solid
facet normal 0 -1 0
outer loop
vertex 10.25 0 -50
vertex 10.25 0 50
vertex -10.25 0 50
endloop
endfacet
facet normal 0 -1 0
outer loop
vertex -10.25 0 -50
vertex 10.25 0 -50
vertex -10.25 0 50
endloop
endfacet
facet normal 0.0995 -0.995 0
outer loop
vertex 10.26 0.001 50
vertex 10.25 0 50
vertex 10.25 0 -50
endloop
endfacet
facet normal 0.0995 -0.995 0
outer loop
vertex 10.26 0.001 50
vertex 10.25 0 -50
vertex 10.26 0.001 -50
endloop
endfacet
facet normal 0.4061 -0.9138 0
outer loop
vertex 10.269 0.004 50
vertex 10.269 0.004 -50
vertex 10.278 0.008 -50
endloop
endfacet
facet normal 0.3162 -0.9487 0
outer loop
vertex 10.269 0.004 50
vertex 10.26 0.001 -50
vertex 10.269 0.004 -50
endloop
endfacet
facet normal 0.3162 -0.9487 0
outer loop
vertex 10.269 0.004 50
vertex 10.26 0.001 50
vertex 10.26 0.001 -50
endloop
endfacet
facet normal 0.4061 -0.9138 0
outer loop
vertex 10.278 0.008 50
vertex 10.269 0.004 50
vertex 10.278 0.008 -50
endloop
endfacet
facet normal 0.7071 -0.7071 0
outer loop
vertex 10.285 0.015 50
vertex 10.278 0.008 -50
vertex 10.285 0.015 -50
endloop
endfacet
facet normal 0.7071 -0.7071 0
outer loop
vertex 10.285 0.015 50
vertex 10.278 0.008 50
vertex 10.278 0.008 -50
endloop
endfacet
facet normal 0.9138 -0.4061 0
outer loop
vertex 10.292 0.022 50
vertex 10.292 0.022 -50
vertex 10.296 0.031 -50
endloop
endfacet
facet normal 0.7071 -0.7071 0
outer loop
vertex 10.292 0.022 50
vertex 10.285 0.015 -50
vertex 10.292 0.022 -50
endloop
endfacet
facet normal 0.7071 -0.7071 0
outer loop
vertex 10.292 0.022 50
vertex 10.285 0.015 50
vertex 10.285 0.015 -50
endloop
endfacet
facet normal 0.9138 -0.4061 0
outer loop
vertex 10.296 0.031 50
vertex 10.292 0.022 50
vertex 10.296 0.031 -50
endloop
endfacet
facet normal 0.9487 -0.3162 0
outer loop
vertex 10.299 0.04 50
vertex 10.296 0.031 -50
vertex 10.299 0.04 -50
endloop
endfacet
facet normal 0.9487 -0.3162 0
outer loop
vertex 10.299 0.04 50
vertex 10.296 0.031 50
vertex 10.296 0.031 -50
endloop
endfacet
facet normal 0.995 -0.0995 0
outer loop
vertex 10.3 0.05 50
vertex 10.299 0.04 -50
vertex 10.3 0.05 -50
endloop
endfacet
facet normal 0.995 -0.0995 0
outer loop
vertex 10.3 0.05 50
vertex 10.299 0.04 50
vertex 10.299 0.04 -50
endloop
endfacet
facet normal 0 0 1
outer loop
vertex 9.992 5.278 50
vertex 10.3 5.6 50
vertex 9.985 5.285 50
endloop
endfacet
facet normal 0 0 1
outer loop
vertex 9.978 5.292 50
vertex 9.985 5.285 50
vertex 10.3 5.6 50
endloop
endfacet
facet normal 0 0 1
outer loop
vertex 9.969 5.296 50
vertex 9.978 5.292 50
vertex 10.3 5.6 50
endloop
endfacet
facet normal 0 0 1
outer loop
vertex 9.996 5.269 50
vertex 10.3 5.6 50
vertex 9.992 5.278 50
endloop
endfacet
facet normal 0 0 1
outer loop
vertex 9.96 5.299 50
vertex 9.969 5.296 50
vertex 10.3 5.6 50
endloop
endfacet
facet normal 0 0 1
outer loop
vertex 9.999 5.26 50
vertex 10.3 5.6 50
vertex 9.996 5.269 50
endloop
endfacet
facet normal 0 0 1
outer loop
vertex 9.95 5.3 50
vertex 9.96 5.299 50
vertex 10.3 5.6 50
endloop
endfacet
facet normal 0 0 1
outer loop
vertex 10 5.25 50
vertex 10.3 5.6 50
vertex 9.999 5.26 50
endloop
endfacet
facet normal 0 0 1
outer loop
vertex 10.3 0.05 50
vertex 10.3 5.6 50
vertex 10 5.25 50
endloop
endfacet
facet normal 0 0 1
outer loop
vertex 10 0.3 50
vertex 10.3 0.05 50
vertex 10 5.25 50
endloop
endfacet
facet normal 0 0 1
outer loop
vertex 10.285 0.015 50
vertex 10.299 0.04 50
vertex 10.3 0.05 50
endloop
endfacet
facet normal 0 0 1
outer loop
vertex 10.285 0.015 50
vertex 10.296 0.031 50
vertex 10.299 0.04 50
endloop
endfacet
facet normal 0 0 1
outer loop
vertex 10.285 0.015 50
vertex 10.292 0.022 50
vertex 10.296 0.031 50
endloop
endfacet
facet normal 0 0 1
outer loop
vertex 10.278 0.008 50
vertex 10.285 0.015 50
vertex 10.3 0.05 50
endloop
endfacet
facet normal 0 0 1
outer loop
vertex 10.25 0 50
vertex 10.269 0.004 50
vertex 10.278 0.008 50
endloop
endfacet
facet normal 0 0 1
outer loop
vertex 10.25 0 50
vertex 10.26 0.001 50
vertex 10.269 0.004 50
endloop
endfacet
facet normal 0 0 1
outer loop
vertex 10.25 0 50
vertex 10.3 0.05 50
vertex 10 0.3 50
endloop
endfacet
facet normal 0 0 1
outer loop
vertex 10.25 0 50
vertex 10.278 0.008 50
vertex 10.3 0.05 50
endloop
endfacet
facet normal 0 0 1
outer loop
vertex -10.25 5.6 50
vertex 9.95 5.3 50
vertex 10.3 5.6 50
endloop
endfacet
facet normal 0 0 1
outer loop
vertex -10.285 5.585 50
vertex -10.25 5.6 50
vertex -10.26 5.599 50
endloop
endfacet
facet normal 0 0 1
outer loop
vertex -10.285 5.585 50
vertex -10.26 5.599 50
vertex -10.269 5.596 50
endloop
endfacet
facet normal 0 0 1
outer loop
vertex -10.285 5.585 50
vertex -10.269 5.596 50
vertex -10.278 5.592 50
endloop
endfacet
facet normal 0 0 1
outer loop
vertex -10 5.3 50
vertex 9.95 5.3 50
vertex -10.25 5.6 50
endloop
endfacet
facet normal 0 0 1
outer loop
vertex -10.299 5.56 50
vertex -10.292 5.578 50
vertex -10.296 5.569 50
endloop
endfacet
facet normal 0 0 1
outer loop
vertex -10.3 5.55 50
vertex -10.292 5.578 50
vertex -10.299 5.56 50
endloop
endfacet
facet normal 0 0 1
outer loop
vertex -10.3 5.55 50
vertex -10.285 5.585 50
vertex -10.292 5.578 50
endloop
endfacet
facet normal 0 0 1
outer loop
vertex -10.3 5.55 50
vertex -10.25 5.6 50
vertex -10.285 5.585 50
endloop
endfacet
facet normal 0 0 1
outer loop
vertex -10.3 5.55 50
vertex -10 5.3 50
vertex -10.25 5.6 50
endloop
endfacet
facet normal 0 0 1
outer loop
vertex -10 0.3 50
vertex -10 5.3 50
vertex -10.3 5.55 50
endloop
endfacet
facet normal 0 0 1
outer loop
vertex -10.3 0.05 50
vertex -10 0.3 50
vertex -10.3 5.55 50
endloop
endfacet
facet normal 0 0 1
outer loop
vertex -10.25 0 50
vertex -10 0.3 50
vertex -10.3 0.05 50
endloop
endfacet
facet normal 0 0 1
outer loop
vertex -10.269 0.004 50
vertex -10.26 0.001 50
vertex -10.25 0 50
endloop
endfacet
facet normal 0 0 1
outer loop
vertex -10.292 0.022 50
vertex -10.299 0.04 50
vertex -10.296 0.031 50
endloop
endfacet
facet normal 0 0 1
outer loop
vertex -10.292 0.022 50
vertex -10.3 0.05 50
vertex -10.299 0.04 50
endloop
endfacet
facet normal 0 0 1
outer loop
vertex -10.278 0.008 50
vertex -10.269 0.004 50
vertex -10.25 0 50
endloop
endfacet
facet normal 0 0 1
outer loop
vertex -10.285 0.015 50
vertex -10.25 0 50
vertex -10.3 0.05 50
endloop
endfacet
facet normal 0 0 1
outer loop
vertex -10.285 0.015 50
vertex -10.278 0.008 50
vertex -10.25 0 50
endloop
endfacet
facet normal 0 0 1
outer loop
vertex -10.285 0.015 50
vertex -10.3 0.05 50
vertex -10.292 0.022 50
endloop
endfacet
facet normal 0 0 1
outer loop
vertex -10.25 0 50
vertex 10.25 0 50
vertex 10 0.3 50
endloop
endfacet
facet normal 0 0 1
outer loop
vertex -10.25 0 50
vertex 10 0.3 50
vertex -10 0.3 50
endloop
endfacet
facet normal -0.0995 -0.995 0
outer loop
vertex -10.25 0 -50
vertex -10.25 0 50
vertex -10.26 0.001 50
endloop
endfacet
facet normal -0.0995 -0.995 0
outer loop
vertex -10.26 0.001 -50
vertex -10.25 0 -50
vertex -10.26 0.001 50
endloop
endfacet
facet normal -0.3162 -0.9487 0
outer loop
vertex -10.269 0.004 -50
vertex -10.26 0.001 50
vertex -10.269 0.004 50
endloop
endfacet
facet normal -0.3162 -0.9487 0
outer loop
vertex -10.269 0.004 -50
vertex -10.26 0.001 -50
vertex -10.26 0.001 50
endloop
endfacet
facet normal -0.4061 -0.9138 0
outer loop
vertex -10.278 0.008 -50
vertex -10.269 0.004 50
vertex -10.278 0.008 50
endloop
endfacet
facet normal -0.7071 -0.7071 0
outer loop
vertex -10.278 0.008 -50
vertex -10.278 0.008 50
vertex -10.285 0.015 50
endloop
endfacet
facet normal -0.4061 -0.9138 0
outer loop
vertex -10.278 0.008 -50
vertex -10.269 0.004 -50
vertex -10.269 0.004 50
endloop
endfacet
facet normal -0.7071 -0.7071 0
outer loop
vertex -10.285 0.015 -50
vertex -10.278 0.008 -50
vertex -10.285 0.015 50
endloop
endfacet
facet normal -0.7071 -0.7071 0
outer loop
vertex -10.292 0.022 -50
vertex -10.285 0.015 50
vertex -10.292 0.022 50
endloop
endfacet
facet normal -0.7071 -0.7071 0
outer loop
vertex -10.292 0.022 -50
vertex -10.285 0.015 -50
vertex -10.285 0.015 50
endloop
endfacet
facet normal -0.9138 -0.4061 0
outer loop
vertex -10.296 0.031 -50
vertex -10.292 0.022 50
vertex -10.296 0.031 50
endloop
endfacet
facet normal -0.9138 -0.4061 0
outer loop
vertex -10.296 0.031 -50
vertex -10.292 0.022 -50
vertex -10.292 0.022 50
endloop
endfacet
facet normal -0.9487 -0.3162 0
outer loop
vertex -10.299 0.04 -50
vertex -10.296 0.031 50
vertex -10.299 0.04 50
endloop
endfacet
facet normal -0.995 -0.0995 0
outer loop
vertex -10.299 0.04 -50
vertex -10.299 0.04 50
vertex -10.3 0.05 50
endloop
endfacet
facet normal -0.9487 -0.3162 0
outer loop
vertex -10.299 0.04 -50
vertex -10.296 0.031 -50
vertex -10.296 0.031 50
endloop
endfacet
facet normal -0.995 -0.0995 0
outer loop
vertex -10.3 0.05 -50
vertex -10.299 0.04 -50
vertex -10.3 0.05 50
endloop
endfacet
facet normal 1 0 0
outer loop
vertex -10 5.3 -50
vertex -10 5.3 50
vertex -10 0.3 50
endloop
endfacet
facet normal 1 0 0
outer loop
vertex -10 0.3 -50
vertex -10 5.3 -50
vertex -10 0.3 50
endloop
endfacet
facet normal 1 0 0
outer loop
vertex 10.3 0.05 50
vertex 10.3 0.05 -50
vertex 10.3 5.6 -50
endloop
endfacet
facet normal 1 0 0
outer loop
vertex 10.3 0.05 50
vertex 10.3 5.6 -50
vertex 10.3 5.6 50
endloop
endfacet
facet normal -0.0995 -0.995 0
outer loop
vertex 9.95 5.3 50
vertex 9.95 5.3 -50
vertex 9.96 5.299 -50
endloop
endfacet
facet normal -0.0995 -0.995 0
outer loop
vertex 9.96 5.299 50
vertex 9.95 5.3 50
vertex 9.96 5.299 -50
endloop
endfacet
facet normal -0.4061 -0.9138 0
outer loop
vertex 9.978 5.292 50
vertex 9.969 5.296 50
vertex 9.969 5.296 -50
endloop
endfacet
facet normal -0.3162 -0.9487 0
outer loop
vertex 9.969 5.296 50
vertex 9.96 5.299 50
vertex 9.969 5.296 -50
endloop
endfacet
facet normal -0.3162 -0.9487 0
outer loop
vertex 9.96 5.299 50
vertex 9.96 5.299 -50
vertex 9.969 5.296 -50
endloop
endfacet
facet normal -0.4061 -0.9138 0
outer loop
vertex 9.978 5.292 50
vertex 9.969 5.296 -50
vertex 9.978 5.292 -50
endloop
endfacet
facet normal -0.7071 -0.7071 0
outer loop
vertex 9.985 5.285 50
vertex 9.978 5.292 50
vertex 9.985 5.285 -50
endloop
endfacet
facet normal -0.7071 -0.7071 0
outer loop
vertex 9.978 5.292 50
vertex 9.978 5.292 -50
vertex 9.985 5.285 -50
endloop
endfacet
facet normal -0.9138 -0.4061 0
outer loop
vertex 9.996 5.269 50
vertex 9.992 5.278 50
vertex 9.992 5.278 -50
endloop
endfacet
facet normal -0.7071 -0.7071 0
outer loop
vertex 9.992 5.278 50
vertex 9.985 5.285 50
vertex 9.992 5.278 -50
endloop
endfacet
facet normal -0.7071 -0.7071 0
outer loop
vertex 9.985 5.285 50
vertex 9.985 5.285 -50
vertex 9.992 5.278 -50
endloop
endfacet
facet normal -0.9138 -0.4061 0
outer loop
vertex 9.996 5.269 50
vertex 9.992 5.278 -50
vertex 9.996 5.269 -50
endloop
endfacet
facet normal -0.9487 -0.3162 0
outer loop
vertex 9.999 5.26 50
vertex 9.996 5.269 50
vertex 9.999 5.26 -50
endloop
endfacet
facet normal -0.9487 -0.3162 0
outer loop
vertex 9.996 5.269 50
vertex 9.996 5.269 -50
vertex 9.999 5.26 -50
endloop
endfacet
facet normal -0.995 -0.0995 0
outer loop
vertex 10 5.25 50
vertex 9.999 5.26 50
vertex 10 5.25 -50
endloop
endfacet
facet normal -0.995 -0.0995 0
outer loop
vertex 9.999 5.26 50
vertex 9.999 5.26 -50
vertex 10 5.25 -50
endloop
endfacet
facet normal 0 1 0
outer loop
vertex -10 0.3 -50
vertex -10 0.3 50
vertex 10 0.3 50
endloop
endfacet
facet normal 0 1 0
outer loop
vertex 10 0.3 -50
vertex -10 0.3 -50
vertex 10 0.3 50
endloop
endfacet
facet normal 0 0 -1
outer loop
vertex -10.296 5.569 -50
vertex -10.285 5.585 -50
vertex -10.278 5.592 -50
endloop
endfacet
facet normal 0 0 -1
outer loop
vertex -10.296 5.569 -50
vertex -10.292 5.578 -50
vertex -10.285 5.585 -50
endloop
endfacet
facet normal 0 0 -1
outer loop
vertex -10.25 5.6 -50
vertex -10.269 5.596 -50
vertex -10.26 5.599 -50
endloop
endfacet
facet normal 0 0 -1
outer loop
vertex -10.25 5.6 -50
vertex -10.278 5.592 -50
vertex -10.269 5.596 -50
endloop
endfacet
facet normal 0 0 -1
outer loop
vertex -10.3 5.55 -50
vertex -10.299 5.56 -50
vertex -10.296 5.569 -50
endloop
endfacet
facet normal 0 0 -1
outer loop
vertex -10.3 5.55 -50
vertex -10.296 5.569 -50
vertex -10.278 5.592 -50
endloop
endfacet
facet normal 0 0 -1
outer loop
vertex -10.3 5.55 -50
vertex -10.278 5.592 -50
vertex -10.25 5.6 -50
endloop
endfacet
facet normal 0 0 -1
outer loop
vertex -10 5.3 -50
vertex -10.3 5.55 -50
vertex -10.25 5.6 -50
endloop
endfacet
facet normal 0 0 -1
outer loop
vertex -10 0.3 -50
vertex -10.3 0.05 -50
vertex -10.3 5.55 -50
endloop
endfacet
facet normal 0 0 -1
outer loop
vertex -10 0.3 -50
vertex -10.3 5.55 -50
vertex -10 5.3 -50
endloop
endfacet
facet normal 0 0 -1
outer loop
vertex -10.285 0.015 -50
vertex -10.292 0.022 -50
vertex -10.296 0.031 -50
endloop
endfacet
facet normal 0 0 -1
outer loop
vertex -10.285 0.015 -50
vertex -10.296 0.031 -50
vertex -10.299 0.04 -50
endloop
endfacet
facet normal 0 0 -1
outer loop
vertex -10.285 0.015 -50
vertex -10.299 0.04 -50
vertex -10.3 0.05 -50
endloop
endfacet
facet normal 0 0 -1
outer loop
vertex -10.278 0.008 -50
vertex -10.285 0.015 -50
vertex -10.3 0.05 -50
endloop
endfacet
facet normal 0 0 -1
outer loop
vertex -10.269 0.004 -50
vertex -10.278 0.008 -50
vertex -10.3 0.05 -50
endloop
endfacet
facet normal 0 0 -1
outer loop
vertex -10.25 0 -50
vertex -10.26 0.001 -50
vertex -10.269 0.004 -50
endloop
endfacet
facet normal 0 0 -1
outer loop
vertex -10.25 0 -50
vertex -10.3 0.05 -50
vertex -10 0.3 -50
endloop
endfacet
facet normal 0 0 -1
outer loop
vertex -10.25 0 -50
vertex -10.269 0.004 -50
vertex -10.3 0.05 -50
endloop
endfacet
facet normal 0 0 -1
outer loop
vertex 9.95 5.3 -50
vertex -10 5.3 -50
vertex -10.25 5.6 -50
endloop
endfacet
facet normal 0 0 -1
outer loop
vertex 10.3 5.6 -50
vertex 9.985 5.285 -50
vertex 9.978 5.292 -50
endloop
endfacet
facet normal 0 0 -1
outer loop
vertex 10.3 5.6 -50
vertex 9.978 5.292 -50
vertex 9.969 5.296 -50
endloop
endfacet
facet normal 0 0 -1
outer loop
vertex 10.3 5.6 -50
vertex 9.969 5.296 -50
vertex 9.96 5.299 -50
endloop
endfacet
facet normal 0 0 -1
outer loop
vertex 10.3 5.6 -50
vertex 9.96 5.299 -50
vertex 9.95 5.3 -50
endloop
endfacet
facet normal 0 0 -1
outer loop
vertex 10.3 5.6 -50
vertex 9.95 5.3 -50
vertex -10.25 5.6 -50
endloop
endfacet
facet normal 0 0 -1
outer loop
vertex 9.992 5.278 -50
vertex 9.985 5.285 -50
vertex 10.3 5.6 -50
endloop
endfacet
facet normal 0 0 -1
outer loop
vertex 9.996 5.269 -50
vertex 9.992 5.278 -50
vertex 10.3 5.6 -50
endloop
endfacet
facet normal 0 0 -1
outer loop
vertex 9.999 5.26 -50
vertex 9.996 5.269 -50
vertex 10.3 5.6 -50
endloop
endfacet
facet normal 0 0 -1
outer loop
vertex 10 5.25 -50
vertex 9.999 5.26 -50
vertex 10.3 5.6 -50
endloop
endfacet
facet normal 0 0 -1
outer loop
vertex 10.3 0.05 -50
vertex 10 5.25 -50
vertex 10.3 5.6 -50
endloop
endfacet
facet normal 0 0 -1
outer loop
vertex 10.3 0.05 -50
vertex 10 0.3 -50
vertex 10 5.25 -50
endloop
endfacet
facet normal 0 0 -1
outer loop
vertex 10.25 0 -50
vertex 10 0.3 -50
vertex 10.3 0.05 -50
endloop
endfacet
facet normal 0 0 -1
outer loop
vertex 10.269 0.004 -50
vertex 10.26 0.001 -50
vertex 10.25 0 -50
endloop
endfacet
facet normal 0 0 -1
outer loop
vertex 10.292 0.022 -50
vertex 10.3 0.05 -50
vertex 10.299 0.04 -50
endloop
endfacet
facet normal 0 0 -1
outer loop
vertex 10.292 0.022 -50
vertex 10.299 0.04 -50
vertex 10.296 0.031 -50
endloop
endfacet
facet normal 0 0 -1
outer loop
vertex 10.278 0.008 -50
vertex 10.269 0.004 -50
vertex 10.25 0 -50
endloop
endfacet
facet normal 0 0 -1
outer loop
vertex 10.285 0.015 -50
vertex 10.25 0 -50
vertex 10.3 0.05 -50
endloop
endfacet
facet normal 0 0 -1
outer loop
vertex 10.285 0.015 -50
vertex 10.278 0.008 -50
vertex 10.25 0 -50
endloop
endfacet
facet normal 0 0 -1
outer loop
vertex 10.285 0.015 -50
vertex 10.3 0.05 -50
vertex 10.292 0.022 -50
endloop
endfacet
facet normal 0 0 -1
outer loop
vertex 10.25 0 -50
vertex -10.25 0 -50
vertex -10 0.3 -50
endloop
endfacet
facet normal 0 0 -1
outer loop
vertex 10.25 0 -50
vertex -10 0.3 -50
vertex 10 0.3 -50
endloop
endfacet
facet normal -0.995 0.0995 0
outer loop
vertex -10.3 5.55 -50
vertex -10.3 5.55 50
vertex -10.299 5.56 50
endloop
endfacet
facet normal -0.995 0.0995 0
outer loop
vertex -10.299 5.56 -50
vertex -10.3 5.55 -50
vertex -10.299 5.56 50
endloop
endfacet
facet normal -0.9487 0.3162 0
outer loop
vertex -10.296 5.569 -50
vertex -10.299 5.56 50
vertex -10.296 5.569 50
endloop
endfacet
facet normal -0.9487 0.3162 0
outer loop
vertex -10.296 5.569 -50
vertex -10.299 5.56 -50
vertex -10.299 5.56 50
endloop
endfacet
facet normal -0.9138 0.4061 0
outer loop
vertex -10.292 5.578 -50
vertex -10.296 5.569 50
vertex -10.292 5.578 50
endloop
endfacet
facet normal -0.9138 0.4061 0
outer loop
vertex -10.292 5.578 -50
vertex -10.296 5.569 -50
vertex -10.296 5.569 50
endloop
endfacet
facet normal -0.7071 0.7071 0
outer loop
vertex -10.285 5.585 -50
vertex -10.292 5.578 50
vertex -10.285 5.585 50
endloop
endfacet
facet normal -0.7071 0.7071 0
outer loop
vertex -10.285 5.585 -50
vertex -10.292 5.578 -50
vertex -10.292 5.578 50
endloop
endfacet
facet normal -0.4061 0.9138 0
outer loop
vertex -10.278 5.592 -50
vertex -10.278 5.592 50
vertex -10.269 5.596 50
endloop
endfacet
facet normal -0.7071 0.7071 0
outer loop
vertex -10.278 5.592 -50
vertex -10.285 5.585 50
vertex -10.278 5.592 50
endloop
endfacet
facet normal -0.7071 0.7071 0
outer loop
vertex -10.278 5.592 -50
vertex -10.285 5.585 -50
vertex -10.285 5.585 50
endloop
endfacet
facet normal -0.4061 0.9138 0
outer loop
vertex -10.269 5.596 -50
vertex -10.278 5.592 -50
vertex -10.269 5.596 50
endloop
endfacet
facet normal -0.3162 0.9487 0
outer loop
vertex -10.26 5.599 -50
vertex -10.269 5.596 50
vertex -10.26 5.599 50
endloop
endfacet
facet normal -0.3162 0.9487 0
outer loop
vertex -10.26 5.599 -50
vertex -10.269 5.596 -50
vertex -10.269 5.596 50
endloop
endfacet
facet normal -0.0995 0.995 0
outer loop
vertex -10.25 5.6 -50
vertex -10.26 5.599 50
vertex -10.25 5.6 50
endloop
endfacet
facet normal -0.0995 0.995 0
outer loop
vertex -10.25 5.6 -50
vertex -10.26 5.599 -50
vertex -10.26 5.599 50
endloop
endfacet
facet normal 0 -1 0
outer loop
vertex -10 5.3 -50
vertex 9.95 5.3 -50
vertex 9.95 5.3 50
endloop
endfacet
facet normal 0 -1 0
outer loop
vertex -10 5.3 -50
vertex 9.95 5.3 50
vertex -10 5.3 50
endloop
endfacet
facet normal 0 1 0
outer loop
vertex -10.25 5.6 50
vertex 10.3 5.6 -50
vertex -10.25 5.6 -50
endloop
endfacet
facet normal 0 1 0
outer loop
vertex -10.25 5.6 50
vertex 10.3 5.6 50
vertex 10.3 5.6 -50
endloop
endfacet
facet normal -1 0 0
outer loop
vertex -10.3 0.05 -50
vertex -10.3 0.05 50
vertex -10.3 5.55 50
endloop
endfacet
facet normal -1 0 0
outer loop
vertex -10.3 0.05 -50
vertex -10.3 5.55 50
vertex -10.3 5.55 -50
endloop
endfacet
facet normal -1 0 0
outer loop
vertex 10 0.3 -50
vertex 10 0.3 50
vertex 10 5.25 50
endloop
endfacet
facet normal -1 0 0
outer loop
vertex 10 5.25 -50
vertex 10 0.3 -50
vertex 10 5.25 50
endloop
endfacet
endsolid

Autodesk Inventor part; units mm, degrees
ref_plane "YZ Plane" through (0, 0, 0) normal (1, 0, 0) x (0, 1, 0)
ref_plane "XZ Plane" through (0, 0, 0) normal (0, 1, 0) x (-1, 0, 0)
ref_plane "XY Plane" through (0, 0, 0) normal (0, 0, 1) x (1, 0, 0)
sketch "Sketch1" plane through (0, 0, 0) normal (0, 1, 0) x (-1, 0, 0)
  line L0 (-10.3, 50) -> (10.3, 50)
  line L1 (10.3, 50) -> (10.3, -50)
  line L2 (10.3, -50) -> (-10.3, -50)
  line L3 (-10.3, -50) -> (-10.3, 50)
  line L4 (-10.3, 50) -> (10.3, -50) construction
  line L5 (10.3, 50) -> (-10.3, -50) construction
  point P0 (0, 0)
  dimension "d0" = 100
  dimension "d1" = 20.6
extrude "Extrusion1" add sketch "Sketch1" along normal blind 5.6
sketch "Sketch2" plane through (-10.3, 0, 50) normal (0, 0, 1) x (1, 0, 0)
  line L0 (0.3, 0.3) -> (20.3, 0.3)
  line L1 (20.3, 0.3) -> (20.3, 5.3)
  line L2 (20.3, 5.3) -> (0.3, 5.3)
  line L3 (0.3, 5.3) -> (0.3, 0.3)
  line L4 (0, 0) -> (20.6, 0) projected
  line L5 (0, 5.6) -> (20.6, 5.6) projected
  line L6 (20.6, 0) -> (20.6, 5.6) projected
  line L7 (0, 0) -> (0, 5.6) projected
  point P0 (10.3, 0)
  dimension "d4" = 0.3
  dimension "d5" = 0.3
  dimension "d6" = 0.3
  dimension "d7" = 0.3
extrude "Extrusion2" cut sketch "Sketch2" against normal through all contours L3 L2 L1 L0
fillet "Fillet1" radius 0.05 4 edges at (-10.3, 5.6, 0) (-10.3, 0, 0) (10, 5.3, 0) (10.3, 0, 0)
properties part number "RubberPiece"
